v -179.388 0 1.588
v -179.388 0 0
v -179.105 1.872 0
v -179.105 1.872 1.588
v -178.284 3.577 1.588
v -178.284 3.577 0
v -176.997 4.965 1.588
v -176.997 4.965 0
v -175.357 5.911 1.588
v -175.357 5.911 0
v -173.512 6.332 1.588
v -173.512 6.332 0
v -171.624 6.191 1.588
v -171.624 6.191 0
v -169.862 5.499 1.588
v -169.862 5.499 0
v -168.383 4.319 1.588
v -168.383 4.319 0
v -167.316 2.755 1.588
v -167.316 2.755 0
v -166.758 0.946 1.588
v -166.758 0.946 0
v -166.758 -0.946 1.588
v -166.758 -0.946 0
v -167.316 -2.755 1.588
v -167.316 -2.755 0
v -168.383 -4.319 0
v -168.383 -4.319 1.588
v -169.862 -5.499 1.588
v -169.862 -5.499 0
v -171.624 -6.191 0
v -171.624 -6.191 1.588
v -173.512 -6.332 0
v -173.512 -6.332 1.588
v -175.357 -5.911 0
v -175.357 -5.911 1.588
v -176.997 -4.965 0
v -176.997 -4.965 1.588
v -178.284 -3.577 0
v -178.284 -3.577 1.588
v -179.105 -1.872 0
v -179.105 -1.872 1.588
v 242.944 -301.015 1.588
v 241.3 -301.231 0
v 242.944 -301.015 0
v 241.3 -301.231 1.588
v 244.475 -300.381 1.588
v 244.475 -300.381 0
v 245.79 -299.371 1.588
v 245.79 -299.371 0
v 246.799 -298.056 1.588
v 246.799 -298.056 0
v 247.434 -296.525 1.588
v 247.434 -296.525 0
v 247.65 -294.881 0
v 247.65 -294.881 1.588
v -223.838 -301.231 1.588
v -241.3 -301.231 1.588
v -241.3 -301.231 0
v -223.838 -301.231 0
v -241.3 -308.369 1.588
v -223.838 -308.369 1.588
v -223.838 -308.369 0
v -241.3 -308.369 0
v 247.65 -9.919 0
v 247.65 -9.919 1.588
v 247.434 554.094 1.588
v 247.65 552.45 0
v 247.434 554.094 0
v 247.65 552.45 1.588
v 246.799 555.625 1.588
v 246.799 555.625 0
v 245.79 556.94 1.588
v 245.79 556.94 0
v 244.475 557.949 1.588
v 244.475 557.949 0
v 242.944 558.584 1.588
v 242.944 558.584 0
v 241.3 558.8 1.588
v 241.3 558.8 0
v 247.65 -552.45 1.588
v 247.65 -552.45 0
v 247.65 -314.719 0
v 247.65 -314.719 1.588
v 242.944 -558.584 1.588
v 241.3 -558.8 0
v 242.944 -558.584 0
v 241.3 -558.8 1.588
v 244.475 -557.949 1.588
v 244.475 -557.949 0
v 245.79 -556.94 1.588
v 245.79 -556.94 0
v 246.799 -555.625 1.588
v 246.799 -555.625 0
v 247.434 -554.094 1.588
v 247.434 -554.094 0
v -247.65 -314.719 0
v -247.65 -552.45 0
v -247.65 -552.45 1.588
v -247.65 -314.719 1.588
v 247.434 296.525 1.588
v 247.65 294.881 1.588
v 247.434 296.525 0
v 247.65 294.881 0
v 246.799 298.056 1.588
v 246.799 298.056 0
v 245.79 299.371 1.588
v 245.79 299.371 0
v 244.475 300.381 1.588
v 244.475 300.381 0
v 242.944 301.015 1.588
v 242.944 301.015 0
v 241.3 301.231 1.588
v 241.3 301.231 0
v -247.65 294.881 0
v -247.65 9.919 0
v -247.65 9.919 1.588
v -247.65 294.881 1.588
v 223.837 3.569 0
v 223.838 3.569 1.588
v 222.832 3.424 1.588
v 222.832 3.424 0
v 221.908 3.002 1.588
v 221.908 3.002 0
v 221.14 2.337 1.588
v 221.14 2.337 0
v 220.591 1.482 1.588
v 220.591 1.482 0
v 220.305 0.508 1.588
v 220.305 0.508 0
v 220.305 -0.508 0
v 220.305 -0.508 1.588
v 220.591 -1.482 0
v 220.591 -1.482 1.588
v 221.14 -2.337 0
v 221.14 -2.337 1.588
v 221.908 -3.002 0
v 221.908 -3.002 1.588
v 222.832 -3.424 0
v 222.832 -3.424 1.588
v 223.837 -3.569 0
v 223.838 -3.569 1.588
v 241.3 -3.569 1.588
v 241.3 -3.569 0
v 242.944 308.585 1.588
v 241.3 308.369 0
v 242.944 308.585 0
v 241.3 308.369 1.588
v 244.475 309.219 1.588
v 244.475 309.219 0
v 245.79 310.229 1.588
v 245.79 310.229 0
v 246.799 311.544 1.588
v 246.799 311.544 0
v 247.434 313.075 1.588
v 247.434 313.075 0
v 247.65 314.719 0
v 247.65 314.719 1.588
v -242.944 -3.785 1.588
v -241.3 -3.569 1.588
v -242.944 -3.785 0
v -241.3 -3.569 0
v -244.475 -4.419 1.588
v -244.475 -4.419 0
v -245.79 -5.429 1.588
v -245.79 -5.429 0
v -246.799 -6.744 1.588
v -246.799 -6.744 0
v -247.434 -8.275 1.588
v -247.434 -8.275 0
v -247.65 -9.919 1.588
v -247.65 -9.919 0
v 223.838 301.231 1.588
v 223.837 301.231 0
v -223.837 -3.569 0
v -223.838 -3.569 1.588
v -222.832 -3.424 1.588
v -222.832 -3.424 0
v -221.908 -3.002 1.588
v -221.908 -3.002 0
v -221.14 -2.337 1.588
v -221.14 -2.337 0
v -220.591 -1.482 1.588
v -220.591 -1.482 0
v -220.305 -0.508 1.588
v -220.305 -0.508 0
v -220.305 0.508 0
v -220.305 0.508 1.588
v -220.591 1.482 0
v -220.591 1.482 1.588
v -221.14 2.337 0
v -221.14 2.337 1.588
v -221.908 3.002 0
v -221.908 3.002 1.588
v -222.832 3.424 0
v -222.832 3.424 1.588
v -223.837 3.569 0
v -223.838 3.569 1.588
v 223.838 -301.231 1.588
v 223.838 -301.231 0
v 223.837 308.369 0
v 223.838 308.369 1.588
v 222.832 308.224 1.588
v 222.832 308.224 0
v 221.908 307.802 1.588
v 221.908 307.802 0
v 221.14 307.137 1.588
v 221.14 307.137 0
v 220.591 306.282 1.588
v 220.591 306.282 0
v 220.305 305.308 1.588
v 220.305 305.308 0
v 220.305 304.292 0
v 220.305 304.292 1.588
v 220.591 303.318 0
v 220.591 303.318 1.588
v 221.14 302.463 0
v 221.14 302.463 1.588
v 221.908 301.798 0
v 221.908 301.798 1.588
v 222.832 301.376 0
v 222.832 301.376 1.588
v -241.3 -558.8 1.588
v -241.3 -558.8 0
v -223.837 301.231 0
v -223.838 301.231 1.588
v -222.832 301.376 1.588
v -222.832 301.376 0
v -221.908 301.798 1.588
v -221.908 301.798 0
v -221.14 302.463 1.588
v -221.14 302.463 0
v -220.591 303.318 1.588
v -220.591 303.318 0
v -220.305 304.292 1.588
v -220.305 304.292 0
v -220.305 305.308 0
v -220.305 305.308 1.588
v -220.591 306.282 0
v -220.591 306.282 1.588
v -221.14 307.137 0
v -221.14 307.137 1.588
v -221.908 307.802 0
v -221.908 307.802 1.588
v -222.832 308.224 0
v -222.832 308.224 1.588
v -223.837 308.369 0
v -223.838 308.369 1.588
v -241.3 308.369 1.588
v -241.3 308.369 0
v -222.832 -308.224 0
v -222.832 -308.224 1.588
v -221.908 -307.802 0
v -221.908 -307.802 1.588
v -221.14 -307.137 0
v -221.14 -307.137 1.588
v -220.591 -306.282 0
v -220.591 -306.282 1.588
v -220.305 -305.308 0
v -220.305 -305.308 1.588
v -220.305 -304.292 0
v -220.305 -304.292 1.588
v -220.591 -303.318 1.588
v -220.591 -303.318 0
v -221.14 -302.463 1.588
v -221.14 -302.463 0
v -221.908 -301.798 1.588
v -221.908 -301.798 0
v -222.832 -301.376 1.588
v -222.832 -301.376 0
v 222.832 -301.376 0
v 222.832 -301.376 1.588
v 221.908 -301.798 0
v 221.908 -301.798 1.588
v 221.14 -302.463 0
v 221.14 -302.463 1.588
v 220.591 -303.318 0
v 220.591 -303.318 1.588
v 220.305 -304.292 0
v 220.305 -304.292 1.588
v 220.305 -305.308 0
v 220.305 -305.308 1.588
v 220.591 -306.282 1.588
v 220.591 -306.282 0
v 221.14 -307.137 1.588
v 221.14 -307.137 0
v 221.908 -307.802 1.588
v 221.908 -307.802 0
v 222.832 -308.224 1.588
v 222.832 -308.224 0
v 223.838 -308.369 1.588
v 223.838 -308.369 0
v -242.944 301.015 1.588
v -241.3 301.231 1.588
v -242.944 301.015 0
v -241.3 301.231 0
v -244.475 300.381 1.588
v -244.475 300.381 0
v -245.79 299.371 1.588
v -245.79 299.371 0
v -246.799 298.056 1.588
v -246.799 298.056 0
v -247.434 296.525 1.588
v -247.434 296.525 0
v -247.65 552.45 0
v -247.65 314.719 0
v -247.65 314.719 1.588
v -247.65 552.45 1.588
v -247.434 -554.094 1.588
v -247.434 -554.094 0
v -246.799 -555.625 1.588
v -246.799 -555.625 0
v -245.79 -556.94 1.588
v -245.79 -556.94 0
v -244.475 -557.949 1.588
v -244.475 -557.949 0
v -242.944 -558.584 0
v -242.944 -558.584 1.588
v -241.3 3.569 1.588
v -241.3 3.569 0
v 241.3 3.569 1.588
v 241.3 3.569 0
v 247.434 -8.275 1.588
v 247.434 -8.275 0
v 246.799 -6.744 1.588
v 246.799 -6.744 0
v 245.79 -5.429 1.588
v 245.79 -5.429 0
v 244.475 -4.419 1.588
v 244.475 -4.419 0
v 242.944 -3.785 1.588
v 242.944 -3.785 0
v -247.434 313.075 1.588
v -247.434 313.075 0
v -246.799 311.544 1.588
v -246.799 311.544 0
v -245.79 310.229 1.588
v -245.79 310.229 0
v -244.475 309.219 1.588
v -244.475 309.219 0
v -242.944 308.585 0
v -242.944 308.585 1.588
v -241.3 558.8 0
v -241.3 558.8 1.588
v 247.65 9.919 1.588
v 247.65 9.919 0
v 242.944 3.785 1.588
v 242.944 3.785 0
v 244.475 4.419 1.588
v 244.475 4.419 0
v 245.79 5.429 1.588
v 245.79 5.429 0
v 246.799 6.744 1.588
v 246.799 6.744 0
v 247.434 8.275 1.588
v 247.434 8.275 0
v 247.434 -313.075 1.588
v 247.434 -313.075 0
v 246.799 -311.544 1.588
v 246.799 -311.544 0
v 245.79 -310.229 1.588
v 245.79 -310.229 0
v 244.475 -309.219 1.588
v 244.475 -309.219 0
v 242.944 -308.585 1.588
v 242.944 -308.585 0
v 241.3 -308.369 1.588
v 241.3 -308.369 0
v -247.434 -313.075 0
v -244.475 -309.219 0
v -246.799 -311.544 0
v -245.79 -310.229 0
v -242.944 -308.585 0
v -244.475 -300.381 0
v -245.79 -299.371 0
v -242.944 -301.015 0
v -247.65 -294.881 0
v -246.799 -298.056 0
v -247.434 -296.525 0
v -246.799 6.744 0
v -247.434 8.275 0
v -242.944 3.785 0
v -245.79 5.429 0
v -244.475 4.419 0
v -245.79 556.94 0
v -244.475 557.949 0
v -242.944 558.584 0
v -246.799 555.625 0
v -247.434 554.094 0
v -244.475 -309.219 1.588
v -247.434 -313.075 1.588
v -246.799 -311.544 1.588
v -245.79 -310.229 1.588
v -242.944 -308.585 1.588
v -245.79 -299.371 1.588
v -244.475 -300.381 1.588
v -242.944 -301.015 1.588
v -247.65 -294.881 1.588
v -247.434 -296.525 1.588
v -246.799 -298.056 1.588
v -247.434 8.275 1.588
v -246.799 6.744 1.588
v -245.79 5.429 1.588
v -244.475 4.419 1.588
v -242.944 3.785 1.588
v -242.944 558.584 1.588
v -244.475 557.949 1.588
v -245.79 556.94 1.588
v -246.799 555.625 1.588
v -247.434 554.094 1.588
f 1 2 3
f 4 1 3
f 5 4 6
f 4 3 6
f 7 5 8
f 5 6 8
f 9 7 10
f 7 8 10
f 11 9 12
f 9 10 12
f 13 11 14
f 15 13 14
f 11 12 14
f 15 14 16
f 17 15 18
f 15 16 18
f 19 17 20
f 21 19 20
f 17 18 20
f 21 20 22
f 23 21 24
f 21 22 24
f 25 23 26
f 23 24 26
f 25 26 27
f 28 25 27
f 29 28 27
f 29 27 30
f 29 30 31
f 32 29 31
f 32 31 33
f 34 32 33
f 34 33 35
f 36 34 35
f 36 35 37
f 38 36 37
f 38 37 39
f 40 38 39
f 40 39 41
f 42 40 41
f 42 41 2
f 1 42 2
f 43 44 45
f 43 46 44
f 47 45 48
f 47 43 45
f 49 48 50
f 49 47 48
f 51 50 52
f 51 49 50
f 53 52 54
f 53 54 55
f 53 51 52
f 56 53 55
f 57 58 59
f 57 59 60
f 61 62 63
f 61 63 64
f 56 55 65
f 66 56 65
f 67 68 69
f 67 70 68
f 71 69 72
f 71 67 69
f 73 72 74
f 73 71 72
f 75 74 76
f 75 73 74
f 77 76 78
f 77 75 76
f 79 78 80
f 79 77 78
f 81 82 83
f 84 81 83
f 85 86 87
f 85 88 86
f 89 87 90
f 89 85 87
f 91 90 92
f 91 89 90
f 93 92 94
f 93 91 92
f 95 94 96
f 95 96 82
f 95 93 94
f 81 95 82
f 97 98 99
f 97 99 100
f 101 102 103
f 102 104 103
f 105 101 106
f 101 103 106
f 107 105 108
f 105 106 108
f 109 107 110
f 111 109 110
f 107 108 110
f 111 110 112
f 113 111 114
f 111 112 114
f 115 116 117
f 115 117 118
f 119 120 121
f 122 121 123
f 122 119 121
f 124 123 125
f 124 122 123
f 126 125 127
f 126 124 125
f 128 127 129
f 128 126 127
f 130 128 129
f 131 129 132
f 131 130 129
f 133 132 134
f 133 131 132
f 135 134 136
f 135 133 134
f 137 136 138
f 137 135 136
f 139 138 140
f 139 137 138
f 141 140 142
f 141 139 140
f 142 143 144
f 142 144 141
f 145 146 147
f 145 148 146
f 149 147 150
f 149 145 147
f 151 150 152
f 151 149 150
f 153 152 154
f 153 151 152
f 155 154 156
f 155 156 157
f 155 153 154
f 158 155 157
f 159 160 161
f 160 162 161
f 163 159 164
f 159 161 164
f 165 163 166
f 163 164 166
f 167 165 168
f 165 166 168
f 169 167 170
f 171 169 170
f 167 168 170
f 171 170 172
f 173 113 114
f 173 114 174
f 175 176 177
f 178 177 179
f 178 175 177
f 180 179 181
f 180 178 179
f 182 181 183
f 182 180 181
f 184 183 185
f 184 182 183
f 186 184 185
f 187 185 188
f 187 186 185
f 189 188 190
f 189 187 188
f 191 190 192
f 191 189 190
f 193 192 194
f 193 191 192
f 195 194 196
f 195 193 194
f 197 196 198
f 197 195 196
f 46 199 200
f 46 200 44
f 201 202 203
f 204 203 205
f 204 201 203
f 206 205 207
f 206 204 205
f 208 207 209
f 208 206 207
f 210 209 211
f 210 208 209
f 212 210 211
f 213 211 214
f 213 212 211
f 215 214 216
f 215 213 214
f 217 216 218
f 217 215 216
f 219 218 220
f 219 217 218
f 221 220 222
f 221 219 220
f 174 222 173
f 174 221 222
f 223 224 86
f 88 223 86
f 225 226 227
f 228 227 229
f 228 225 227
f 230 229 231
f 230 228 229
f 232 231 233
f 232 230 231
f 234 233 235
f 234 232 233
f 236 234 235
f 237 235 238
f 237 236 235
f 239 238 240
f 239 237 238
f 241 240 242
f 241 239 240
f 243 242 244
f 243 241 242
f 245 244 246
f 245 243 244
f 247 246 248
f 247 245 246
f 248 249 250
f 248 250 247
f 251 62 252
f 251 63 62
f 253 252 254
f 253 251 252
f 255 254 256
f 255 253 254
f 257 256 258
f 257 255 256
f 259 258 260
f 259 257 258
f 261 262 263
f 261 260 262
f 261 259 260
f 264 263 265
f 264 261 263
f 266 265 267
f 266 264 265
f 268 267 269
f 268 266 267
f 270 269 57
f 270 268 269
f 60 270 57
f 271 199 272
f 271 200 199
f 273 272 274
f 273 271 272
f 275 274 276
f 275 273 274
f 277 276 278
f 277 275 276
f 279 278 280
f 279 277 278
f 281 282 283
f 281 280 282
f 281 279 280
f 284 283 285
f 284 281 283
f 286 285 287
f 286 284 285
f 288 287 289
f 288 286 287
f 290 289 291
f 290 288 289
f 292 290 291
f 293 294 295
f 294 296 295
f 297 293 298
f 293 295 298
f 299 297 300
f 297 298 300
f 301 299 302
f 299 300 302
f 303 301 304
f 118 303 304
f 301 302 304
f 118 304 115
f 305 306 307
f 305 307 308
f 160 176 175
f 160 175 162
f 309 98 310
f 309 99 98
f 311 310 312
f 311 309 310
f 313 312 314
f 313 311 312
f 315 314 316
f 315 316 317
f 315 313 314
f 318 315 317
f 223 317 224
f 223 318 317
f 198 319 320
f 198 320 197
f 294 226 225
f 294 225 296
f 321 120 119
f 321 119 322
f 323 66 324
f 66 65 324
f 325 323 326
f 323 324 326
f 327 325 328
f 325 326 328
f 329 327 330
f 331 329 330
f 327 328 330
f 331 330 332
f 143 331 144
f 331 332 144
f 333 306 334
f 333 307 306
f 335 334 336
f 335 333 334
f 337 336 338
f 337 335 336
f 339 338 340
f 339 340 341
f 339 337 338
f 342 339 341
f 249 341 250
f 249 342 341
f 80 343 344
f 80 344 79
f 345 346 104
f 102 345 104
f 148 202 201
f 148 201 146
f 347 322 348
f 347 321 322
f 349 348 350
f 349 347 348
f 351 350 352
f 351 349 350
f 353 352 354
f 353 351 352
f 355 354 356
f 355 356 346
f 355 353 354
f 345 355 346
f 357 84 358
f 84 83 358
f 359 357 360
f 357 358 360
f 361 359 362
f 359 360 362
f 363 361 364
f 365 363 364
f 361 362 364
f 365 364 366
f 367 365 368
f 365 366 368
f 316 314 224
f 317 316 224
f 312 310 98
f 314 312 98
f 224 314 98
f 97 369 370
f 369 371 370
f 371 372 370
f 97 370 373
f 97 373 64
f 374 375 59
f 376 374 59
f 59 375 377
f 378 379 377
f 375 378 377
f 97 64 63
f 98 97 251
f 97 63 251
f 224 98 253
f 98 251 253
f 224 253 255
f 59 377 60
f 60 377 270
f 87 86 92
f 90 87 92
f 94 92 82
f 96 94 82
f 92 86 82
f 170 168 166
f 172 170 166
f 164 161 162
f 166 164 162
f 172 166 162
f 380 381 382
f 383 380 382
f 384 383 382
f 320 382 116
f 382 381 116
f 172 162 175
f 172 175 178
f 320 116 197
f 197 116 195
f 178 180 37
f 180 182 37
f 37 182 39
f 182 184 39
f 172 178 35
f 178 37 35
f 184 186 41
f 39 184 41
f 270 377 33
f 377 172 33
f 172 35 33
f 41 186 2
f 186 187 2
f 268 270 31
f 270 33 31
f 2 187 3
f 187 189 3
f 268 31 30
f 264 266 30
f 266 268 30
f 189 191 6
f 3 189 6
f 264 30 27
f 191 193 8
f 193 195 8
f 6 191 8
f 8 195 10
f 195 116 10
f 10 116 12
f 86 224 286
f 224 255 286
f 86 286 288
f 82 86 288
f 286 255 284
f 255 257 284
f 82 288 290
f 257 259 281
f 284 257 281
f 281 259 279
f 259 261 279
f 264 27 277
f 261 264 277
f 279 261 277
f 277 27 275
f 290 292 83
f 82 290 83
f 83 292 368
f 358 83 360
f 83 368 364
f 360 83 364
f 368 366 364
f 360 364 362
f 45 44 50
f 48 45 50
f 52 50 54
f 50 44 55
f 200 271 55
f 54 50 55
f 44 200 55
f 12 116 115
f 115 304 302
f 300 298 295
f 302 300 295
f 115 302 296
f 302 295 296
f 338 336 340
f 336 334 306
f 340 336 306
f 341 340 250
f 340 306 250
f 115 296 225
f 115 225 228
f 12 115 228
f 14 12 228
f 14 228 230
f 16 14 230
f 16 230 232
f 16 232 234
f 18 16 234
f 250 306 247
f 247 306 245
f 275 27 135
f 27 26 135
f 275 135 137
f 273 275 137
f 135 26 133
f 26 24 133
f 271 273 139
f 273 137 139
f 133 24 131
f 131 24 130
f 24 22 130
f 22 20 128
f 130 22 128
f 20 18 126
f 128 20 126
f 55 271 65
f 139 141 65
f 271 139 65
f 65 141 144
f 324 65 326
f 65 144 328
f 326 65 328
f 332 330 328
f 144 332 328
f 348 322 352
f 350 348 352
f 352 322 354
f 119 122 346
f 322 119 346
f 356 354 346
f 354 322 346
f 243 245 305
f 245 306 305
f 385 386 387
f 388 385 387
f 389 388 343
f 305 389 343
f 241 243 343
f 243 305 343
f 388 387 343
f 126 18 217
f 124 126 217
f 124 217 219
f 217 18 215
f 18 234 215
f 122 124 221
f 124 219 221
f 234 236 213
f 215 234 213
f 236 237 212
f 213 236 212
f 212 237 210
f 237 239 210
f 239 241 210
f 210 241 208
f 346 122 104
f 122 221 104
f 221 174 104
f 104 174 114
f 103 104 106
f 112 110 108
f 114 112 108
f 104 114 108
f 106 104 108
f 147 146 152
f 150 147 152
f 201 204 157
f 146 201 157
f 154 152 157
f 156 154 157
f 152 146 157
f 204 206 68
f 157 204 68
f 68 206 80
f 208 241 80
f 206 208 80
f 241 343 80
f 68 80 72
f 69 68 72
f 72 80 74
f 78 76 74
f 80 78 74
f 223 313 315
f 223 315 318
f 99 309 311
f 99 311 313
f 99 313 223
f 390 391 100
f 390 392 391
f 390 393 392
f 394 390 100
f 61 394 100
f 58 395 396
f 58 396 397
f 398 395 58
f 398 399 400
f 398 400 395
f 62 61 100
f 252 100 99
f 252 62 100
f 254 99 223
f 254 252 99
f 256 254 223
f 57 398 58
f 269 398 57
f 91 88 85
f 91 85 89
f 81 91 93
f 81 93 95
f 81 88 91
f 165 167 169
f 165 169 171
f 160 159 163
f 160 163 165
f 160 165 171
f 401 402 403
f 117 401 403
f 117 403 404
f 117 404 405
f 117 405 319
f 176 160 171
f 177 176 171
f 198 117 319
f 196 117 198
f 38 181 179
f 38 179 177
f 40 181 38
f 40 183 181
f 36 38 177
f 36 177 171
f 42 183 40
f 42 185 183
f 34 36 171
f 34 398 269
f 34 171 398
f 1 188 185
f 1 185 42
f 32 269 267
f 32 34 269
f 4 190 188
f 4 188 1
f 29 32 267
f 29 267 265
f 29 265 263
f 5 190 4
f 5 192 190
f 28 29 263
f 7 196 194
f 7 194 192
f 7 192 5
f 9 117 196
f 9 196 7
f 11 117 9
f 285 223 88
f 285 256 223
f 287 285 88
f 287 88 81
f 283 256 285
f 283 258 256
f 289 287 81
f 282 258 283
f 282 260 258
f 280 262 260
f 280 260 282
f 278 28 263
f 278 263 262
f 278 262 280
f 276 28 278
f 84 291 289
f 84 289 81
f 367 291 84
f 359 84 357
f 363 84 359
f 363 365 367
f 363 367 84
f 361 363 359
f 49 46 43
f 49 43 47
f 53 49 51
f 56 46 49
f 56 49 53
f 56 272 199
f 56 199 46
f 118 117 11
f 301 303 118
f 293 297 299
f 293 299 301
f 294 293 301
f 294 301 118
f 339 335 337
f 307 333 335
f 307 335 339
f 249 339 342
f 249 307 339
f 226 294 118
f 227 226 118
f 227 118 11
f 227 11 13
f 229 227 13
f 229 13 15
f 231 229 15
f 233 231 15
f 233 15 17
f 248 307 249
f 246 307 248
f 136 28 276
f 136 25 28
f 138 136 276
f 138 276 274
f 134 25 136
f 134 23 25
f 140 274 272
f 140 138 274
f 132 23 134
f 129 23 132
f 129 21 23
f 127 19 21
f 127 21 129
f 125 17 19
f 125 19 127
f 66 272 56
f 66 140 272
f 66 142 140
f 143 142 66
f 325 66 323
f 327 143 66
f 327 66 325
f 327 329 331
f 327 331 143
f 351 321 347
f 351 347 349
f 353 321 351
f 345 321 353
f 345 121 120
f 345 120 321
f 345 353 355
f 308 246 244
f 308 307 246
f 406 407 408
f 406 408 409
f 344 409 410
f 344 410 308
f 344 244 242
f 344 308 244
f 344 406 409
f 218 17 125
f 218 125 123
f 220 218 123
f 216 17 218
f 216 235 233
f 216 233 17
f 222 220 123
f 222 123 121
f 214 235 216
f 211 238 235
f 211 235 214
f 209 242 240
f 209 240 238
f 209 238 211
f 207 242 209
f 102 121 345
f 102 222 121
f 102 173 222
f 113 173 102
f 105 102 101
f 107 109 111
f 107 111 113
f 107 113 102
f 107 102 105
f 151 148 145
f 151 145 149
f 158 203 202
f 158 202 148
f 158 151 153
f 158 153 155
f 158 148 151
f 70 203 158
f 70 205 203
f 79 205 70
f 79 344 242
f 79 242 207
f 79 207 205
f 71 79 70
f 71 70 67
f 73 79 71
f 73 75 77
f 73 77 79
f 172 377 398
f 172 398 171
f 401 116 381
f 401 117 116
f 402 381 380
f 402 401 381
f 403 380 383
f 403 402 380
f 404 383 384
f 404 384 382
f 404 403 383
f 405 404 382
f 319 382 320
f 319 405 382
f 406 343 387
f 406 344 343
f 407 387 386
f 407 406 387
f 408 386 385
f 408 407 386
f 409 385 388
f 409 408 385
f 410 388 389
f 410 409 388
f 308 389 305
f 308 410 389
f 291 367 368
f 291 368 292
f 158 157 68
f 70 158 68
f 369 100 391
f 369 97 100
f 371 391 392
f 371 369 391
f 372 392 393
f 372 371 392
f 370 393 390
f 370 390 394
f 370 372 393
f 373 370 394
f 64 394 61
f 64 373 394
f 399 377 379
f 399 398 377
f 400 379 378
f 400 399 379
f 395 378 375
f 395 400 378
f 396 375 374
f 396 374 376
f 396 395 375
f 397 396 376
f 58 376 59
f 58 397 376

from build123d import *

# Parameters (mm, degrees)
SKETCH1_W           = 495.3
SKETCH1_H           = 1117.6
SKETCH1_R           = 3.5687
BOSS_EXTRUDE1_DEPTH = 1.5875
CUT_EXTRUDE1_DEPTH  = 612.220486123
FILLET1_R           = 6.35
SKETCH3_R           = 6.35
CUT_EXTRUDE2_DEPTH  = 612.220486123


with BuildPart() as part:
    # Sketch1 → Boss-Extrude1 (new body)
    with BuildSketch(Plane.XY):
        Rectangle(SKETCH1_W, SKETCH1_H)
        with Locations((223.8375, 304.8)):
            Circle(SKETCH1_R, mode=Mode.SUBTRACT)
        with Locations((223.8375, -304.8)):
            Circle(SKETCH1_R, mode=Mode.SUBTRACT)
        with Locations((223.8375, 0)):
            Circle(SKETCH1_R, mode=Mode.SUBTRACT)
        with Locations((-223.8375, -304.8)):
            Circle(SKETCH1_R, mode=Mode.SUBTRACT)
        with Locations((-223.8375, 0)):
            Circle(SKETCH1_R, mode=Mode.SUBTRACT)
        with Locations((-223.8375, 304.8)):
            Circle(SKETCH1_R, mode=Mode.SUBTRACT)
    extrude(amount=BOSS_EXTRUDE1_DEPTH)

    # Sketch2 → Cut-Extrude1 (cut, through all)
    with BuildSketch(Plane.XY.offset(1.5875)):
        with BuildLine():
            Line((-223.8375, 301.2313), (-276.915511323, 301.2313))
            ThreePointArc((-276.915511323, 301.2313), (-280.484211323, 304.8), (-276.915511323, 308.3687))
            Line((-276.915511323, 308.3687), (-223.8375, 308.3687))
            ThreePointArc((-223.8375, 308.3687), (-220.2688, 304.8), (-223.8375, 301.2313))
        make_face()
        with BuildLine():
            Line((-223.8375, -3.5687), (-306.276059446, -3.5687))
            ThreePointArc((-306.276059446, -3.5687), (-309.844759446, 0), (-306.276059446, 3.5687))
            Line((-306.276059446, 3.5687), (-223.8375, 3.5687))
            ThreePointArc((-223.8375, 3.5687), (-220.2688, 0), (-223.8375, -3.5687))
        make_face()
        with BuildLine():
            Line((304.87504686, 301.2313), (223.8375, 301.2313))
            ThreePointArc((223.8375, 301.2313), (220.2688, 304.8), (223.8375, 308.3687))
            Line((223.8375, 308.3687), (304.87504686, 308.3687))
            ThreePointArc((304.87504686, 308.3687), (308.44374686, 304.8), (304.87504686, 301.2313))
        make_face()
        with BuildLine():
            Line((299.858272086, -3.5687), (223.8375, -3.5687))
            ThreePointArc((223.8375, -3.5687), (220.2688, 0), (223.8375, 3.5687))
            Line((223.8375, 3.5687), (299.858272086, 3.5687))
            ThreePointArc((299.858272086, 3.5687), (303.426972086, 0), (299.858272086, -3.5687))
        make_face()
        with BuildLine():
            Line((308.359897186, -308.3687), (223.8375, -308.3687))
            ThreePointArc((223.8375, -308.3687), (220.2688, -304.8), (223.8375, -301.2313))
            Line((223.8375, -301.2313), (308.359897186, -301.2313))
            ThreePointArc((308.359897186, -301.2313), (311.928597186, -304.8), (308.359897186, -308.3687))
        make_face()
        with BuildLine():
            Line((-223.8375, -308.3687), (-314.955998192, -308.3687))
            ThreePointArc((-314.955998192, -308.3687), (-318.524698192, -304.8), (-314.955998192, -301.2313))
            Line((-314.955998192, -301.2313), (-223.8375, -301.2313))
            ThreePointArc((-223.8375, -301.2313), (-220.2688, -304.8), (-223.8375, -308.3687))
        make_face()
    extrude(amount=-CUT_EXTRUDE1_DEPTH, mode=Mode.SUBTRACT)

    # Fillet1
    fillet1_edges = [part.edges().sort_by_distance(p)[0] for p in [
        (247.65, -558.8, 0.79375),
        (-247.65, 558.8, 0.79375),
        (247.65, 558.8, 0.79375),
        (-247.65, -558.8, 0.79375),
        (-247.65, -301.2313, 0.79375),
        (-247.65, -3.5687, 0.79375),
        (-247.65, 3.5687, 0.79375),
        (-247.65, 301.2313, 0.79375),
        (-247.65, 308.3687, 0.79375),
        (247.65, 308.3687, 0.79375),
        (247.65, 301.2313, 0.79375),
        (247.65, 3.5687, 0.79375),
        (247.65, -3.5687, 0.79375),
        (247.65, -301.2313, 0.79375),
        (247.65, -308.3687, 0.79375),
        (-247.65, -308.3687, 0.79375),
    ]]
    fillet(fillet1_edges, radius=FILLET1_R)

    # Sketch3 → Cut-Extrude2 (cut, through all)
    with BuildSketch(Plane(origin=(0, 0, 0), x_dir=(-1, 0, 0), z_dir=(0, 0, -1))):
        with Locations((173.0375, 0)):
            Circle(SKETCH3_R)
    extrude(amount=-CUT_EXTRUDE2_DEPTH, mode=Mode.SUBTRACT)


solid = part.part
